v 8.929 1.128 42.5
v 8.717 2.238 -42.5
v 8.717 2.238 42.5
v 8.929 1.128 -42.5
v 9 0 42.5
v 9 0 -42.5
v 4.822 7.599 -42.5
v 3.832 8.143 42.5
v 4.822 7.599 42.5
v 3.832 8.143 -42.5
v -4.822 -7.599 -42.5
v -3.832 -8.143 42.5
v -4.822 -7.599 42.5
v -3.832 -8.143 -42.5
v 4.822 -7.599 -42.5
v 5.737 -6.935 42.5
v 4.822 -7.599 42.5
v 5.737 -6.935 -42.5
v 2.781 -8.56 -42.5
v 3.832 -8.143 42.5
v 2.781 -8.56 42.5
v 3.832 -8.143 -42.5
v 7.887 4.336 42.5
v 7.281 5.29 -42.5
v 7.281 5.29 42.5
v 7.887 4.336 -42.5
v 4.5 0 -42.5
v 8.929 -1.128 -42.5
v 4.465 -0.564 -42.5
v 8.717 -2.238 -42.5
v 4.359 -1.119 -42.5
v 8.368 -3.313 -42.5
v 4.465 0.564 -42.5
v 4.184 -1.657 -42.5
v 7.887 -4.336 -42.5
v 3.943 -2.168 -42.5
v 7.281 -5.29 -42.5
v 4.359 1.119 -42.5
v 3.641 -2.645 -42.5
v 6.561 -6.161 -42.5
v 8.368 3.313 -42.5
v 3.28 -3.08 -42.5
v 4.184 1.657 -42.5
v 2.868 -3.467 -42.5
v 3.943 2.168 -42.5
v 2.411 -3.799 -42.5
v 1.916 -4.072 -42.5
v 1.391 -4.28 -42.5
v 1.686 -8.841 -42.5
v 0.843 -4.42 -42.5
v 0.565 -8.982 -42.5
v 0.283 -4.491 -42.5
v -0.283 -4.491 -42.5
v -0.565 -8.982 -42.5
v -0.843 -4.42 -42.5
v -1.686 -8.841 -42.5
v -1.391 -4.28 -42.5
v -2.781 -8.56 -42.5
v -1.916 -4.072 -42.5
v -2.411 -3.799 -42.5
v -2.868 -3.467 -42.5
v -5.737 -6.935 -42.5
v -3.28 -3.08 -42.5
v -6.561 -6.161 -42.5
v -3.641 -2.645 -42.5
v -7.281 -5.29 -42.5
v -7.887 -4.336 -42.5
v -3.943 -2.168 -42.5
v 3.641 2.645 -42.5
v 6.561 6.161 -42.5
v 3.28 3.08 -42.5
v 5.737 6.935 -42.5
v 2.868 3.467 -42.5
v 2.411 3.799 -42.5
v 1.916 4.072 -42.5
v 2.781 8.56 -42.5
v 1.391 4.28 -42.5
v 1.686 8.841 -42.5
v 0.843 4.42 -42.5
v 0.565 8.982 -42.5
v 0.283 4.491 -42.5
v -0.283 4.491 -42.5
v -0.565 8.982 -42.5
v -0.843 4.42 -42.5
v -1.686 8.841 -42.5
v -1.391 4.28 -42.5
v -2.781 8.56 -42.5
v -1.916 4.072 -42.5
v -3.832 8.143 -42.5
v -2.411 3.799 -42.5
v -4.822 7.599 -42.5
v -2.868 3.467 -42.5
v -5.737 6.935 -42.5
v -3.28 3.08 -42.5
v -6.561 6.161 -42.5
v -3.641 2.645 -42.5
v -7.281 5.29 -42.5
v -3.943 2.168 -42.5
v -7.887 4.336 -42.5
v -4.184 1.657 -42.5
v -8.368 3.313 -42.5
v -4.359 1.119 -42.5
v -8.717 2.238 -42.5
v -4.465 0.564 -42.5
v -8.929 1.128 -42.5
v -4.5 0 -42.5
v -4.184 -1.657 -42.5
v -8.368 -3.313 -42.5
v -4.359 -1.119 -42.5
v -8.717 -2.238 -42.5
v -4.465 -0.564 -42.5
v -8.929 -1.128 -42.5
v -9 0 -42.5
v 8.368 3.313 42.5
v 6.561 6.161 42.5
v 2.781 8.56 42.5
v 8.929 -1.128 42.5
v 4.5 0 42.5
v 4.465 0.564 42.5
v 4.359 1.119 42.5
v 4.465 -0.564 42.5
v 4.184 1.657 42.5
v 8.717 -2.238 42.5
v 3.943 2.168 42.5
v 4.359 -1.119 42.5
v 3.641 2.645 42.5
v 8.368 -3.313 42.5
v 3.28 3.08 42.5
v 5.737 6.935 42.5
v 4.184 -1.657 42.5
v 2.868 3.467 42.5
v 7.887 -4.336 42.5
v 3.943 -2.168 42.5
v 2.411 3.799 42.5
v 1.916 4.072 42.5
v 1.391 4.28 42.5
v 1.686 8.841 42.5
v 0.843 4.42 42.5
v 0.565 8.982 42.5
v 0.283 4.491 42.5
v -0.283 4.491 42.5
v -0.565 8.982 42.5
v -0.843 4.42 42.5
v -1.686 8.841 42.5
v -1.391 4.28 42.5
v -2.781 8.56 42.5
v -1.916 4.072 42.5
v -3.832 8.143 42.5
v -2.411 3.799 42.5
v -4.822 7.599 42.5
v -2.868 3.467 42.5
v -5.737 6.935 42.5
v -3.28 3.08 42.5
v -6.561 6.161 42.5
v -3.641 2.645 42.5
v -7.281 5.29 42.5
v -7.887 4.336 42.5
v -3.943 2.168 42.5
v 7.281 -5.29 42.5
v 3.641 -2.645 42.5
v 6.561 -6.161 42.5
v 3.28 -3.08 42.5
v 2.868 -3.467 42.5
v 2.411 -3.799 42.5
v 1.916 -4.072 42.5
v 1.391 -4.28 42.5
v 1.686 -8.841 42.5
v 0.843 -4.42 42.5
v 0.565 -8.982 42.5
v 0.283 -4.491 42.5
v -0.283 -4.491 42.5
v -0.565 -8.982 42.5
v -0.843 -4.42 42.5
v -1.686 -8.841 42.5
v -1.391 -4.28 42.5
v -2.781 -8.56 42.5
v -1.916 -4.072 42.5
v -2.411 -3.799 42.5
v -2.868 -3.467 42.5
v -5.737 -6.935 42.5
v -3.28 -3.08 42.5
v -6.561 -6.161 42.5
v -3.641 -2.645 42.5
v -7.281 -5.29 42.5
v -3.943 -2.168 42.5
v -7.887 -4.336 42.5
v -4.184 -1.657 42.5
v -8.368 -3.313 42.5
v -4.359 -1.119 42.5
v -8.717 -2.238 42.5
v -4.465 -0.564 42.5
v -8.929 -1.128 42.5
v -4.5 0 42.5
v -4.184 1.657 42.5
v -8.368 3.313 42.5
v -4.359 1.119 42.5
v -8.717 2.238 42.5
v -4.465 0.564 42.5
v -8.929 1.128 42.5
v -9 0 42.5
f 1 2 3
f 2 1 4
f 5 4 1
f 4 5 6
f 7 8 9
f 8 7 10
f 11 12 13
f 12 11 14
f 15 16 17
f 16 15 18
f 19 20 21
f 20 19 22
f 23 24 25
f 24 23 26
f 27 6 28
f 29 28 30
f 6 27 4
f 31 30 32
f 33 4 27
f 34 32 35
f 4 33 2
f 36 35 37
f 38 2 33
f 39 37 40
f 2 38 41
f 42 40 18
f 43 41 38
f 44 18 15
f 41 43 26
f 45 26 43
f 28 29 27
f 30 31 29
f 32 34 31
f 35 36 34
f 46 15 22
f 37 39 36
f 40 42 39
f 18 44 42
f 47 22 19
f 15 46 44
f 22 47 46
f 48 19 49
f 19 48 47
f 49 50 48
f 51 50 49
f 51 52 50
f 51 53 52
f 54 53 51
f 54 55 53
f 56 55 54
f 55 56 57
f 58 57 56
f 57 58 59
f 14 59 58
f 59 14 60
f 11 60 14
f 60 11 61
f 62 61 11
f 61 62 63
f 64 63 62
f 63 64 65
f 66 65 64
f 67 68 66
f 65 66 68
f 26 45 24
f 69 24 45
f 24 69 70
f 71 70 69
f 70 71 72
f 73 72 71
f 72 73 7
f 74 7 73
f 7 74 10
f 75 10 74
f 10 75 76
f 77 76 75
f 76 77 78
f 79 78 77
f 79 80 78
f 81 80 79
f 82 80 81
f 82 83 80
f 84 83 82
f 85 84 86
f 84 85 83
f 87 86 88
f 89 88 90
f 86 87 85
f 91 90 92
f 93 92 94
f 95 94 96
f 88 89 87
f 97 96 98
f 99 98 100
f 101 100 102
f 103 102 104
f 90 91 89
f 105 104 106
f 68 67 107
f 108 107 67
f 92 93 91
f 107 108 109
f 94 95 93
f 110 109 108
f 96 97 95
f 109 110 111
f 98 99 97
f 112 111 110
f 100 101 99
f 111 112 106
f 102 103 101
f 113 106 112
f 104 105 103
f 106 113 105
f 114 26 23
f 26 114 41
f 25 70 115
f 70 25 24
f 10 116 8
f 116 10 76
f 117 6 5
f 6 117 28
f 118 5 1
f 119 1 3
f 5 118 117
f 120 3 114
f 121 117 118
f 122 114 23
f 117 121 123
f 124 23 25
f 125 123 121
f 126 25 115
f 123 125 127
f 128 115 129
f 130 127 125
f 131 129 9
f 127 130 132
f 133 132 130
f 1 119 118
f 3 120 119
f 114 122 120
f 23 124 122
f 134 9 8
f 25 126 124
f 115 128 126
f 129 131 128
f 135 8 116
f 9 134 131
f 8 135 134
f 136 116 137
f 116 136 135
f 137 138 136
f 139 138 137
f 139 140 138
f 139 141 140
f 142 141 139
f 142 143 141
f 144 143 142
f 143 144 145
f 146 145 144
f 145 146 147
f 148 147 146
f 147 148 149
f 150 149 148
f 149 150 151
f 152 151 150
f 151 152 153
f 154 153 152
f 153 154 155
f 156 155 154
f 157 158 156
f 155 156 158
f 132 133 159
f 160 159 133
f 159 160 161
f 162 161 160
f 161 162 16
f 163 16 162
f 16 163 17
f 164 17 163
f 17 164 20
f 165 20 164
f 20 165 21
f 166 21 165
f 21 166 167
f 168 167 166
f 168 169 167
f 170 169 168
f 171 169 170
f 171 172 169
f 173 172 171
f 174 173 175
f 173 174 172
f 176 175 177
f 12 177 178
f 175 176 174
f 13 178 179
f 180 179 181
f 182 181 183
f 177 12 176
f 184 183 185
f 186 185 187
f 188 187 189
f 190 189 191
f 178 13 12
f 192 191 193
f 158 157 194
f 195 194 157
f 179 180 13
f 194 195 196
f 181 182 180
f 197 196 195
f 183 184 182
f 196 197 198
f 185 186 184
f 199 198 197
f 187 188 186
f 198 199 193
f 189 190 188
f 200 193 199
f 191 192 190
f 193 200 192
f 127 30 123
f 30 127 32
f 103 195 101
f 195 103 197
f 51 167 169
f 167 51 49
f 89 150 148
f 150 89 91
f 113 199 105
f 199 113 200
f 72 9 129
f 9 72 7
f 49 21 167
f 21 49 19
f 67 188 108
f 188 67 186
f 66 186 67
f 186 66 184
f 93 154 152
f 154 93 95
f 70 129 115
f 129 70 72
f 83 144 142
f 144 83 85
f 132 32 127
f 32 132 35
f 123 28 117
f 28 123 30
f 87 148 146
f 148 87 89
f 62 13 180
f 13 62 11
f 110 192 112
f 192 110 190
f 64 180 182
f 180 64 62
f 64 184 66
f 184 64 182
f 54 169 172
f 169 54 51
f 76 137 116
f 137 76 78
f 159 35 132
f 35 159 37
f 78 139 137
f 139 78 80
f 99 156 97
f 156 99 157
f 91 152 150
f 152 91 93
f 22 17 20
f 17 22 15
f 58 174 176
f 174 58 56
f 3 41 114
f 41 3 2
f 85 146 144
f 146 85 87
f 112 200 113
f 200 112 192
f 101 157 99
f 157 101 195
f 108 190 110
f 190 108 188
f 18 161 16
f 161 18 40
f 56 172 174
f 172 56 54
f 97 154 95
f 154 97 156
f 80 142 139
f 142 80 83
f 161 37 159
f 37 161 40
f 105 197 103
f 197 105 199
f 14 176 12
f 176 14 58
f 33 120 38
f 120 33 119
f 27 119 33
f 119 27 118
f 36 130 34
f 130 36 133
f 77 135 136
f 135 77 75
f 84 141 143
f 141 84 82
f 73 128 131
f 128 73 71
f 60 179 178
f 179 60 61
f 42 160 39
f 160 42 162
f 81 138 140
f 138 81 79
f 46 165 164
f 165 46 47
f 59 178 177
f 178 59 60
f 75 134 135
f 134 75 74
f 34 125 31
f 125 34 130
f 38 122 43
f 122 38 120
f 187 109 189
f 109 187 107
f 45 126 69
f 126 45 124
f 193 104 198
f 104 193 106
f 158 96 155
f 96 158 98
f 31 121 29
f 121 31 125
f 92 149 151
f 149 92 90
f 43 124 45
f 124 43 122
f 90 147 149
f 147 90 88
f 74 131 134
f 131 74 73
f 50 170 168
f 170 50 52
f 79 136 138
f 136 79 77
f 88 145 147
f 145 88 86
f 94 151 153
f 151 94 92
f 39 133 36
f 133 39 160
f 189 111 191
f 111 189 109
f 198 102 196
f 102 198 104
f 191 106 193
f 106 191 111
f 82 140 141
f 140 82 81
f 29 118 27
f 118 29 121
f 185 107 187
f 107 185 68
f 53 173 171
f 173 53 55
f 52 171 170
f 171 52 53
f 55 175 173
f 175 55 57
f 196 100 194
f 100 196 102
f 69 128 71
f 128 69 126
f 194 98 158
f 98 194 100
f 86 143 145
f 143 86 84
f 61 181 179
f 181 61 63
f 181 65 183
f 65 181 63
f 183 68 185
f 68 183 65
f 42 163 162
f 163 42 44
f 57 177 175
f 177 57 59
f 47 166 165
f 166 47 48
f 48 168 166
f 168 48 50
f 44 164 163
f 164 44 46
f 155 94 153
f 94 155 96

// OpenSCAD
$fn = 50;


difference() {
	union() {
		translate(v = [0, 0, -42.5000000000]) {
			cylinder(h = 85, r = 9.0000000000);
		}
	}
	union() {
		translate(v = [0, 0, -100.0000000000]) {
			cylinder(h = 200, r = 4.5000000000);
		}
	}
}
